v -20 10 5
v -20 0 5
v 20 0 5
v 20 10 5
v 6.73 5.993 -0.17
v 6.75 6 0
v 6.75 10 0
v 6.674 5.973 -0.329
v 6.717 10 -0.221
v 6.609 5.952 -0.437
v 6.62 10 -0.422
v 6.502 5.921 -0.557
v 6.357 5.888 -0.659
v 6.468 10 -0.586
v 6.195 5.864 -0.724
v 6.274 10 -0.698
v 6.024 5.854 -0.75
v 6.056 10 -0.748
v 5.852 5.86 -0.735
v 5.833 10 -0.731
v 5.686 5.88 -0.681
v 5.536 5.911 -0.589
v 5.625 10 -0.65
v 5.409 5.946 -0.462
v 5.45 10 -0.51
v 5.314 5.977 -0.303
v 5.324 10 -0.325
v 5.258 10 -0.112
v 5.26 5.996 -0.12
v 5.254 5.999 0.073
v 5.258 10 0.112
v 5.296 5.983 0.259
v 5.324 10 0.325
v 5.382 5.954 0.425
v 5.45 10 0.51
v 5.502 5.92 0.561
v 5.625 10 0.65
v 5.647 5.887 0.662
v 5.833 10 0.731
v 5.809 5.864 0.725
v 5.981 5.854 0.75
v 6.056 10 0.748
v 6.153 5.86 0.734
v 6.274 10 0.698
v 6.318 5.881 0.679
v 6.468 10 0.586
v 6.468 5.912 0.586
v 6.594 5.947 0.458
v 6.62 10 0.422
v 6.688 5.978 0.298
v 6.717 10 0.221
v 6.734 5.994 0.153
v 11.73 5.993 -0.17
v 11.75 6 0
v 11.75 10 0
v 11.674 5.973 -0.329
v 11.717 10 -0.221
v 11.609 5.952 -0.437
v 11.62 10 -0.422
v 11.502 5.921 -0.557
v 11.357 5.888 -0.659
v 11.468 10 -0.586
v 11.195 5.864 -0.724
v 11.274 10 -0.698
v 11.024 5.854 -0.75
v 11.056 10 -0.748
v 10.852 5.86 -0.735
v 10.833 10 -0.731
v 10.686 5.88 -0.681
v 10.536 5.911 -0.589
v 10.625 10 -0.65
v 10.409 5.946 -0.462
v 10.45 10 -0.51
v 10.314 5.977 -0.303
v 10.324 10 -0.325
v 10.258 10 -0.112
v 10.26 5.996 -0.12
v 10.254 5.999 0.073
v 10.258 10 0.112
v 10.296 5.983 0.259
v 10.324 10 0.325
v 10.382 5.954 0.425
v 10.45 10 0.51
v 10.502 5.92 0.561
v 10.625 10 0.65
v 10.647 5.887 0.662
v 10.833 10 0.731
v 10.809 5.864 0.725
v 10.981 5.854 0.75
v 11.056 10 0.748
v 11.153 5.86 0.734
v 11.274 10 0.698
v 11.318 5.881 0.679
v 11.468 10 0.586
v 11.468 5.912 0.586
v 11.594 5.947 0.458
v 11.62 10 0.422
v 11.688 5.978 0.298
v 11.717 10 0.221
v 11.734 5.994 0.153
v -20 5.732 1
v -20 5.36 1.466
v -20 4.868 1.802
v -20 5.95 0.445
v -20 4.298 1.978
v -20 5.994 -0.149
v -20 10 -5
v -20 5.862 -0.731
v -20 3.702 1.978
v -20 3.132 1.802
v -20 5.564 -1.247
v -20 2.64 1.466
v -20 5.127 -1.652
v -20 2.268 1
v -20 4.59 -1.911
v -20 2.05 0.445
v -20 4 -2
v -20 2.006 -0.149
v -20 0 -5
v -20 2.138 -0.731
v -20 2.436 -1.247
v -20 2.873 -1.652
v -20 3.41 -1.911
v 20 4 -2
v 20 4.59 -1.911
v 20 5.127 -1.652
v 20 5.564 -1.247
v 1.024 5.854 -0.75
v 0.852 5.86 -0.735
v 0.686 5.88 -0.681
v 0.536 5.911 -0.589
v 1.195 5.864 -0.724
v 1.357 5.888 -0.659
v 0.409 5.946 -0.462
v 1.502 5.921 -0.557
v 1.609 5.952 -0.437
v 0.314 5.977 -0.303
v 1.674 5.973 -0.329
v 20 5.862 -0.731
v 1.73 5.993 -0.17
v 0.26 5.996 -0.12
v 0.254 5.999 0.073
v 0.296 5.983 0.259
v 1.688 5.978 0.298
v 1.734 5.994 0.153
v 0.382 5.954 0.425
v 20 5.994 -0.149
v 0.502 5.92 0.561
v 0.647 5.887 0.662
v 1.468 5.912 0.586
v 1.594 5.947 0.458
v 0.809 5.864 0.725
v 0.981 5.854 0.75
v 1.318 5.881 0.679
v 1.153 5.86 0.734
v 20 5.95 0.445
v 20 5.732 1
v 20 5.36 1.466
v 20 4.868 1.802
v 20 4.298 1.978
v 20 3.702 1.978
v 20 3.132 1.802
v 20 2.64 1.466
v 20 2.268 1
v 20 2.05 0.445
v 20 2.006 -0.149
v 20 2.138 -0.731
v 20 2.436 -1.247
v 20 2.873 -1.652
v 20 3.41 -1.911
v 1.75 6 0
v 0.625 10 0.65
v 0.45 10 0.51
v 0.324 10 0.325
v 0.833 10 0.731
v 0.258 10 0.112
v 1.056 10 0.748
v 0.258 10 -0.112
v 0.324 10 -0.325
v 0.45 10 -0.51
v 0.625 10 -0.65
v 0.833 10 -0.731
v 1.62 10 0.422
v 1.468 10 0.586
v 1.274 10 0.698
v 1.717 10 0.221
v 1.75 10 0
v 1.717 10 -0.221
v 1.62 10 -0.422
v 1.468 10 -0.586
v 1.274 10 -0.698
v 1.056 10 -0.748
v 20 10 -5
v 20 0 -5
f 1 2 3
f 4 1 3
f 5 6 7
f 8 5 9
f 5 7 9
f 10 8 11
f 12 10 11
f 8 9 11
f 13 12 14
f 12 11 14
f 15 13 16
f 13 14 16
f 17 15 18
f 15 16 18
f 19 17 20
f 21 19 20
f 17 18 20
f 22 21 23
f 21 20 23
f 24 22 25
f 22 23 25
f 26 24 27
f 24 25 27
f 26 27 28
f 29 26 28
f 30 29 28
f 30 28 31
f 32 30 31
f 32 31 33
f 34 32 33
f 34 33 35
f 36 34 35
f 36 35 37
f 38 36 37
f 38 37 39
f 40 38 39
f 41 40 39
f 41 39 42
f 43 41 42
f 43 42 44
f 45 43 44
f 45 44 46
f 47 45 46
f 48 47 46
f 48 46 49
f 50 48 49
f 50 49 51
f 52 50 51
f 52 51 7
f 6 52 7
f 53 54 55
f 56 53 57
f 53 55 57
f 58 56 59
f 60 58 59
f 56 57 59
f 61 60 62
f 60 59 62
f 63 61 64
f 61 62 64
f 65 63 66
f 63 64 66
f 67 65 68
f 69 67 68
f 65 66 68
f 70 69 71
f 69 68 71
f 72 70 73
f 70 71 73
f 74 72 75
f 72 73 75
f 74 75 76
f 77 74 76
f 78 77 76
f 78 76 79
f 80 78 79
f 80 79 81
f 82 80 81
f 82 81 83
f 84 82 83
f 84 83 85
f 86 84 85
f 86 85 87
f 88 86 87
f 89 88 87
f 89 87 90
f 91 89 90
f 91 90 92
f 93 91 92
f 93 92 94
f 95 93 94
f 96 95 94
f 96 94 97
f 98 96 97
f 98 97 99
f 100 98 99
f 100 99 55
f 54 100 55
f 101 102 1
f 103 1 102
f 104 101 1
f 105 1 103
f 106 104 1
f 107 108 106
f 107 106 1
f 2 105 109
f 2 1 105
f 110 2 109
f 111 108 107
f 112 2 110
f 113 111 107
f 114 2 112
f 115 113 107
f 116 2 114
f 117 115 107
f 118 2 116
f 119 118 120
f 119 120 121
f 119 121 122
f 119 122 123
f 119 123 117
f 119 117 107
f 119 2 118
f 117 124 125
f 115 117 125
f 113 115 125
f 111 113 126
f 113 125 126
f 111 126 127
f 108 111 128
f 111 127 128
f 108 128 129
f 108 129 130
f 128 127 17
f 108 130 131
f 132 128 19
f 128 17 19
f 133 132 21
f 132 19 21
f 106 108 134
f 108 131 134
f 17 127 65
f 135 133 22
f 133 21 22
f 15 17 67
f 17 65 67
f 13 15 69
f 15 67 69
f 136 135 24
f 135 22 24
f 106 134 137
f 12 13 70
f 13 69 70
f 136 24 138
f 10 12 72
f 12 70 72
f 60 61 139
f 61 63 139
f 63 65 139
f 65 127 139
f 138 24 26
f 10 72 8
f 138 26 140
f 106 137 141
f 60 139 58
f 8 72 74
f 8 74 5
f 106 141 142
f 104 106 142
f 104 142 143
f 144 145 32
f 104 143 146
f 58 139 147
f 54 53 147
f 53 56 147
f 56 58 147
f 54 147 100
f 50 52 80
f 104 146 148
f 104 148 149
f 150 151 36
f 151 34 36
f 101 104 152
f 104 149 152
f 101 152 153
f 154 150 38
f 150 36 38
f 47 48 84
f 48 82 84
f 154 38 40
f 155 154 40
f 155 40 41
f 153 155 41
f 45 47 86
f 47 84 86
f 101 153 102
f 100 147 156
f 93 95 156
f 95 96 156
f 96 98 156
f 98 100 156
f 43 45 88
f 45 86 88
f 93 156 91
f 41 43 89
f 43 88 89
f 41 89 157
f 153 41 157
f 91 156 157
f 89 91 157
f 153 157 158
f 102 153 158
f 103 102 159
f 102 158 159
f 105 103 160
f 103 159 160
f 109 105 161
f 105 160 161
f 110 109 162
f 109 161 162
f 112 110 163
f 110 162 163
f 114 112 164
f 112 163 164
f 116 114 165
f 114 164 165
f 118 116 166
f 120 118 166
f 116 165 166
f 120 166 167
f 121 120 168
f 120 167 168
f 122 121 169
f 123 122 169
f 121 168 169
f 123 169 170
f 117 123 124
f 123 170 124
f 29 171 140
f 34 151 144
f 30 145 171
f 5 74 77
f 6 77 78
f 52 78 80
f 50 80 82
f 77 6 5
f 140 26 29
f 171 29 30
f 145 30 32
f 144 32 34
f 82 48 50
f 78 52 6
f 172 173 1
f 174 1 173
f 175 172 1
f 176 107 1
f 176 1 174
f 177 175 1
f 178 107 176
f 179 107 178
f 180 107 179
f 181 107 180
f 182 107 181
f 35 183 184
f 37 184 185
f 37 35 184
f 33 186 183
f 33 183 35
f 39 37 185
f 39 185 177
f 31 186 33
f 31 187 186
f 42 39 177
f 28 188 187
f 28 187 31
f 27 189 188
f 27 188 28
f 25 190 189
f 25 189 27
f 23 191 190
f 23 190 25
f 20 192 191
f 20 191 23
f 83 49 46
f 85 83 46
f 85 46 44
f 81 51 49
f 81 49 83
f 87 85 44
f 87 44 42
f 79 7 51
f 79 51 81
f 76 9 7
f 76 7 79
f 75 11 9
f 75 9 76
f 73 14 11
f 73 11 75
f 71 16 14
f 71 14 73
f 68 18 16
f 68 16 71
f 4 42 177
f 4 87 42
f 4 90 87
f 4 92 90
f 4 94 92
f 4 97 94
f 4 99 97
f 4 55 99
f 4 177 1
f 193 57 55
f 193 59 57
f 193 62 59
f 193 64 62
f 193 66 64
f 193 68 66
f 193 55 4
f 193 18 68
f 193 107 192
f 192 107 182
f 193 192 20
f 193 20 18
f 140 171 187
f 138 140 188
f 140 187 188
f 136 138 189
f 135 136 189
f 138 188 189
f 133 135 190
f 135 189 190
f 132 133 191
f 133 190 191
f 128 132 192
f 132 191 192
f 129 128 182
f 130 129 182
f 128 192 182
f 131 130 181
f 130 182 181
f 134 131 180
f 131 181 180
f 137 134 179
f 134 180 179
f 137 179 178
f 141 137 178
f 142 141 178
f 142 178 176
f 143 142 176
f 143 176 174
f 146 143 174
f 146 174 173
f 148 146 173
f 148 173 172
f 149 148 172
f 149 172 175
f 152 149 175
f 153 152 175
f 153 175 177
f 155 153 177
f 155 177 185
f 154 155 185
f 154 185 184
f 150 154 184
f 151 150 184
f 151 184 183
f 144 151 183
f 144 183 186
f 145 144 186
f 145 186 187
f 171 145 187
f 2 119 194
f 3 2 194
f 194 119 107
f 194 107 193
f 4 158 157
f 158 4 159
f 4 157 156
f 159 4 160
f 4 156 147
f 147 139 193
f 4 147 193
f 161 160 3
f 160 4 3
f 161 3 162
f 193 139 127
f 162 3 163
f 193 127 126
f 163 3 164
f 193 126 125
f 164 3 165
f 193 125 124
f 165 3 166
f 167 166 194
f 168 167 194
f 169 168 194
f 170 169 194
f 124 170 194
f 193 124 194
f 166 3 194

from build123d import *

# Parameters (mm, degrees)
SKETCH1_W           = 40
SKETCH1_H           = 10
BOSS_EXTRUDE1_DEPTH = 10
SKETCH2_R           = 2
CUT_EXTRUDE1_DEPTH  = 41
CUT_EXTRUDE2_REACH  = 12
SKETCH3_R           = 0.75


with BuildPart() as part:
    # Sketch1 → Boss-Extrude1 (new body)
    with BuildSketch(Plane(origin=(0, 0, 0), x_dir=(1, 0, 0), z_dir=(0, 1, 0))):
        Rectangle(SKETCH1_W, SKETCH1_H)
    extrude(amount=BOSS_EXTRUDE1_DEPTH)

    # Sketch2 → Cut-Extrude1 (cut, through all)
    with BuildSketch(Plane(origin=(20, 0, 0), x_dir=(0, 0, -1), z_dir=(1, 0, 0))):
        with Locations((0, 4)):
            Circle(SKETCH2_R)
    extrude(amount=-CUT_EXTRUDE1_DEPTH, mode=Mode.SUBTRACT)

    # Sketch3 → Cut-Extrude2 (cut, up to next)
    with BuildSketch(Plane(origin=(0, 10, 0), x_dir=(1, 0, 0), z_dir=(0, 1, 0)), mode=Mode.PRIVATE) as cut_extrude2_sk1:
        with Locations((11, 0)):
            Circle(SKETCH3_R)
    cut_extrude2_tool1 = extrude(cut_extrude2_sk1.sketch, amount=-CUT_EXTRUDE2_REACH, mode=Mode.PRIVATE) & part.part
    add(cut_extrude2_tool1.solids().sort_by_distance((11, 10, 0))[0], mode=Mode.SUBTRACT)
    # Sketch3 → Cut-Extrude2 (cut, up to next)
    with BuildSketch(Plane(origin=(0, 10, 0), x_dir=(1, 0, 0), z_dir=(0, 1, 0)), mode=Mode.PRIVATE) as cut_extrude2_sk2:
        with Locations((6, 0)):
            Circle(SKETCH3_R)
    cut_extrude2_tool2 = extrude(cut_extrude2_sk2.sketch, amount=-CUT_EXTRUDE2_REACH, mode=Mode.PRIVATE) & part.part
    add(cut_extrude2_tool2.solids().sort_by_distance((6, 10, 0))[0], mode=Mode.SUBTRACT)
    # Sketch3 → Cut-Extrude2 (cut, up to next)
    with BuildSketch(Plane(origin=(0, 10, 0), x_dir=(1, 0, 0), z_dir=(0, 1, 0)), mode=Mode.PRIVATE) as cut_extrude2_sk3:
        with Locations((1, 0)):
            Circle(SKETCH3_R)
    cut_extrude2_tool3 = extrude(cut_extrude2_sk3.sketch, amount=-CUT_EXTRUDE2_REACH, mode=Mode.PRIVATE) & part.part
    add(cut_extrude2_tool3.solids().sort_by_distance((1, 10, 0))[0], mode=Mode.SUBTRACT)


solid = part.part
